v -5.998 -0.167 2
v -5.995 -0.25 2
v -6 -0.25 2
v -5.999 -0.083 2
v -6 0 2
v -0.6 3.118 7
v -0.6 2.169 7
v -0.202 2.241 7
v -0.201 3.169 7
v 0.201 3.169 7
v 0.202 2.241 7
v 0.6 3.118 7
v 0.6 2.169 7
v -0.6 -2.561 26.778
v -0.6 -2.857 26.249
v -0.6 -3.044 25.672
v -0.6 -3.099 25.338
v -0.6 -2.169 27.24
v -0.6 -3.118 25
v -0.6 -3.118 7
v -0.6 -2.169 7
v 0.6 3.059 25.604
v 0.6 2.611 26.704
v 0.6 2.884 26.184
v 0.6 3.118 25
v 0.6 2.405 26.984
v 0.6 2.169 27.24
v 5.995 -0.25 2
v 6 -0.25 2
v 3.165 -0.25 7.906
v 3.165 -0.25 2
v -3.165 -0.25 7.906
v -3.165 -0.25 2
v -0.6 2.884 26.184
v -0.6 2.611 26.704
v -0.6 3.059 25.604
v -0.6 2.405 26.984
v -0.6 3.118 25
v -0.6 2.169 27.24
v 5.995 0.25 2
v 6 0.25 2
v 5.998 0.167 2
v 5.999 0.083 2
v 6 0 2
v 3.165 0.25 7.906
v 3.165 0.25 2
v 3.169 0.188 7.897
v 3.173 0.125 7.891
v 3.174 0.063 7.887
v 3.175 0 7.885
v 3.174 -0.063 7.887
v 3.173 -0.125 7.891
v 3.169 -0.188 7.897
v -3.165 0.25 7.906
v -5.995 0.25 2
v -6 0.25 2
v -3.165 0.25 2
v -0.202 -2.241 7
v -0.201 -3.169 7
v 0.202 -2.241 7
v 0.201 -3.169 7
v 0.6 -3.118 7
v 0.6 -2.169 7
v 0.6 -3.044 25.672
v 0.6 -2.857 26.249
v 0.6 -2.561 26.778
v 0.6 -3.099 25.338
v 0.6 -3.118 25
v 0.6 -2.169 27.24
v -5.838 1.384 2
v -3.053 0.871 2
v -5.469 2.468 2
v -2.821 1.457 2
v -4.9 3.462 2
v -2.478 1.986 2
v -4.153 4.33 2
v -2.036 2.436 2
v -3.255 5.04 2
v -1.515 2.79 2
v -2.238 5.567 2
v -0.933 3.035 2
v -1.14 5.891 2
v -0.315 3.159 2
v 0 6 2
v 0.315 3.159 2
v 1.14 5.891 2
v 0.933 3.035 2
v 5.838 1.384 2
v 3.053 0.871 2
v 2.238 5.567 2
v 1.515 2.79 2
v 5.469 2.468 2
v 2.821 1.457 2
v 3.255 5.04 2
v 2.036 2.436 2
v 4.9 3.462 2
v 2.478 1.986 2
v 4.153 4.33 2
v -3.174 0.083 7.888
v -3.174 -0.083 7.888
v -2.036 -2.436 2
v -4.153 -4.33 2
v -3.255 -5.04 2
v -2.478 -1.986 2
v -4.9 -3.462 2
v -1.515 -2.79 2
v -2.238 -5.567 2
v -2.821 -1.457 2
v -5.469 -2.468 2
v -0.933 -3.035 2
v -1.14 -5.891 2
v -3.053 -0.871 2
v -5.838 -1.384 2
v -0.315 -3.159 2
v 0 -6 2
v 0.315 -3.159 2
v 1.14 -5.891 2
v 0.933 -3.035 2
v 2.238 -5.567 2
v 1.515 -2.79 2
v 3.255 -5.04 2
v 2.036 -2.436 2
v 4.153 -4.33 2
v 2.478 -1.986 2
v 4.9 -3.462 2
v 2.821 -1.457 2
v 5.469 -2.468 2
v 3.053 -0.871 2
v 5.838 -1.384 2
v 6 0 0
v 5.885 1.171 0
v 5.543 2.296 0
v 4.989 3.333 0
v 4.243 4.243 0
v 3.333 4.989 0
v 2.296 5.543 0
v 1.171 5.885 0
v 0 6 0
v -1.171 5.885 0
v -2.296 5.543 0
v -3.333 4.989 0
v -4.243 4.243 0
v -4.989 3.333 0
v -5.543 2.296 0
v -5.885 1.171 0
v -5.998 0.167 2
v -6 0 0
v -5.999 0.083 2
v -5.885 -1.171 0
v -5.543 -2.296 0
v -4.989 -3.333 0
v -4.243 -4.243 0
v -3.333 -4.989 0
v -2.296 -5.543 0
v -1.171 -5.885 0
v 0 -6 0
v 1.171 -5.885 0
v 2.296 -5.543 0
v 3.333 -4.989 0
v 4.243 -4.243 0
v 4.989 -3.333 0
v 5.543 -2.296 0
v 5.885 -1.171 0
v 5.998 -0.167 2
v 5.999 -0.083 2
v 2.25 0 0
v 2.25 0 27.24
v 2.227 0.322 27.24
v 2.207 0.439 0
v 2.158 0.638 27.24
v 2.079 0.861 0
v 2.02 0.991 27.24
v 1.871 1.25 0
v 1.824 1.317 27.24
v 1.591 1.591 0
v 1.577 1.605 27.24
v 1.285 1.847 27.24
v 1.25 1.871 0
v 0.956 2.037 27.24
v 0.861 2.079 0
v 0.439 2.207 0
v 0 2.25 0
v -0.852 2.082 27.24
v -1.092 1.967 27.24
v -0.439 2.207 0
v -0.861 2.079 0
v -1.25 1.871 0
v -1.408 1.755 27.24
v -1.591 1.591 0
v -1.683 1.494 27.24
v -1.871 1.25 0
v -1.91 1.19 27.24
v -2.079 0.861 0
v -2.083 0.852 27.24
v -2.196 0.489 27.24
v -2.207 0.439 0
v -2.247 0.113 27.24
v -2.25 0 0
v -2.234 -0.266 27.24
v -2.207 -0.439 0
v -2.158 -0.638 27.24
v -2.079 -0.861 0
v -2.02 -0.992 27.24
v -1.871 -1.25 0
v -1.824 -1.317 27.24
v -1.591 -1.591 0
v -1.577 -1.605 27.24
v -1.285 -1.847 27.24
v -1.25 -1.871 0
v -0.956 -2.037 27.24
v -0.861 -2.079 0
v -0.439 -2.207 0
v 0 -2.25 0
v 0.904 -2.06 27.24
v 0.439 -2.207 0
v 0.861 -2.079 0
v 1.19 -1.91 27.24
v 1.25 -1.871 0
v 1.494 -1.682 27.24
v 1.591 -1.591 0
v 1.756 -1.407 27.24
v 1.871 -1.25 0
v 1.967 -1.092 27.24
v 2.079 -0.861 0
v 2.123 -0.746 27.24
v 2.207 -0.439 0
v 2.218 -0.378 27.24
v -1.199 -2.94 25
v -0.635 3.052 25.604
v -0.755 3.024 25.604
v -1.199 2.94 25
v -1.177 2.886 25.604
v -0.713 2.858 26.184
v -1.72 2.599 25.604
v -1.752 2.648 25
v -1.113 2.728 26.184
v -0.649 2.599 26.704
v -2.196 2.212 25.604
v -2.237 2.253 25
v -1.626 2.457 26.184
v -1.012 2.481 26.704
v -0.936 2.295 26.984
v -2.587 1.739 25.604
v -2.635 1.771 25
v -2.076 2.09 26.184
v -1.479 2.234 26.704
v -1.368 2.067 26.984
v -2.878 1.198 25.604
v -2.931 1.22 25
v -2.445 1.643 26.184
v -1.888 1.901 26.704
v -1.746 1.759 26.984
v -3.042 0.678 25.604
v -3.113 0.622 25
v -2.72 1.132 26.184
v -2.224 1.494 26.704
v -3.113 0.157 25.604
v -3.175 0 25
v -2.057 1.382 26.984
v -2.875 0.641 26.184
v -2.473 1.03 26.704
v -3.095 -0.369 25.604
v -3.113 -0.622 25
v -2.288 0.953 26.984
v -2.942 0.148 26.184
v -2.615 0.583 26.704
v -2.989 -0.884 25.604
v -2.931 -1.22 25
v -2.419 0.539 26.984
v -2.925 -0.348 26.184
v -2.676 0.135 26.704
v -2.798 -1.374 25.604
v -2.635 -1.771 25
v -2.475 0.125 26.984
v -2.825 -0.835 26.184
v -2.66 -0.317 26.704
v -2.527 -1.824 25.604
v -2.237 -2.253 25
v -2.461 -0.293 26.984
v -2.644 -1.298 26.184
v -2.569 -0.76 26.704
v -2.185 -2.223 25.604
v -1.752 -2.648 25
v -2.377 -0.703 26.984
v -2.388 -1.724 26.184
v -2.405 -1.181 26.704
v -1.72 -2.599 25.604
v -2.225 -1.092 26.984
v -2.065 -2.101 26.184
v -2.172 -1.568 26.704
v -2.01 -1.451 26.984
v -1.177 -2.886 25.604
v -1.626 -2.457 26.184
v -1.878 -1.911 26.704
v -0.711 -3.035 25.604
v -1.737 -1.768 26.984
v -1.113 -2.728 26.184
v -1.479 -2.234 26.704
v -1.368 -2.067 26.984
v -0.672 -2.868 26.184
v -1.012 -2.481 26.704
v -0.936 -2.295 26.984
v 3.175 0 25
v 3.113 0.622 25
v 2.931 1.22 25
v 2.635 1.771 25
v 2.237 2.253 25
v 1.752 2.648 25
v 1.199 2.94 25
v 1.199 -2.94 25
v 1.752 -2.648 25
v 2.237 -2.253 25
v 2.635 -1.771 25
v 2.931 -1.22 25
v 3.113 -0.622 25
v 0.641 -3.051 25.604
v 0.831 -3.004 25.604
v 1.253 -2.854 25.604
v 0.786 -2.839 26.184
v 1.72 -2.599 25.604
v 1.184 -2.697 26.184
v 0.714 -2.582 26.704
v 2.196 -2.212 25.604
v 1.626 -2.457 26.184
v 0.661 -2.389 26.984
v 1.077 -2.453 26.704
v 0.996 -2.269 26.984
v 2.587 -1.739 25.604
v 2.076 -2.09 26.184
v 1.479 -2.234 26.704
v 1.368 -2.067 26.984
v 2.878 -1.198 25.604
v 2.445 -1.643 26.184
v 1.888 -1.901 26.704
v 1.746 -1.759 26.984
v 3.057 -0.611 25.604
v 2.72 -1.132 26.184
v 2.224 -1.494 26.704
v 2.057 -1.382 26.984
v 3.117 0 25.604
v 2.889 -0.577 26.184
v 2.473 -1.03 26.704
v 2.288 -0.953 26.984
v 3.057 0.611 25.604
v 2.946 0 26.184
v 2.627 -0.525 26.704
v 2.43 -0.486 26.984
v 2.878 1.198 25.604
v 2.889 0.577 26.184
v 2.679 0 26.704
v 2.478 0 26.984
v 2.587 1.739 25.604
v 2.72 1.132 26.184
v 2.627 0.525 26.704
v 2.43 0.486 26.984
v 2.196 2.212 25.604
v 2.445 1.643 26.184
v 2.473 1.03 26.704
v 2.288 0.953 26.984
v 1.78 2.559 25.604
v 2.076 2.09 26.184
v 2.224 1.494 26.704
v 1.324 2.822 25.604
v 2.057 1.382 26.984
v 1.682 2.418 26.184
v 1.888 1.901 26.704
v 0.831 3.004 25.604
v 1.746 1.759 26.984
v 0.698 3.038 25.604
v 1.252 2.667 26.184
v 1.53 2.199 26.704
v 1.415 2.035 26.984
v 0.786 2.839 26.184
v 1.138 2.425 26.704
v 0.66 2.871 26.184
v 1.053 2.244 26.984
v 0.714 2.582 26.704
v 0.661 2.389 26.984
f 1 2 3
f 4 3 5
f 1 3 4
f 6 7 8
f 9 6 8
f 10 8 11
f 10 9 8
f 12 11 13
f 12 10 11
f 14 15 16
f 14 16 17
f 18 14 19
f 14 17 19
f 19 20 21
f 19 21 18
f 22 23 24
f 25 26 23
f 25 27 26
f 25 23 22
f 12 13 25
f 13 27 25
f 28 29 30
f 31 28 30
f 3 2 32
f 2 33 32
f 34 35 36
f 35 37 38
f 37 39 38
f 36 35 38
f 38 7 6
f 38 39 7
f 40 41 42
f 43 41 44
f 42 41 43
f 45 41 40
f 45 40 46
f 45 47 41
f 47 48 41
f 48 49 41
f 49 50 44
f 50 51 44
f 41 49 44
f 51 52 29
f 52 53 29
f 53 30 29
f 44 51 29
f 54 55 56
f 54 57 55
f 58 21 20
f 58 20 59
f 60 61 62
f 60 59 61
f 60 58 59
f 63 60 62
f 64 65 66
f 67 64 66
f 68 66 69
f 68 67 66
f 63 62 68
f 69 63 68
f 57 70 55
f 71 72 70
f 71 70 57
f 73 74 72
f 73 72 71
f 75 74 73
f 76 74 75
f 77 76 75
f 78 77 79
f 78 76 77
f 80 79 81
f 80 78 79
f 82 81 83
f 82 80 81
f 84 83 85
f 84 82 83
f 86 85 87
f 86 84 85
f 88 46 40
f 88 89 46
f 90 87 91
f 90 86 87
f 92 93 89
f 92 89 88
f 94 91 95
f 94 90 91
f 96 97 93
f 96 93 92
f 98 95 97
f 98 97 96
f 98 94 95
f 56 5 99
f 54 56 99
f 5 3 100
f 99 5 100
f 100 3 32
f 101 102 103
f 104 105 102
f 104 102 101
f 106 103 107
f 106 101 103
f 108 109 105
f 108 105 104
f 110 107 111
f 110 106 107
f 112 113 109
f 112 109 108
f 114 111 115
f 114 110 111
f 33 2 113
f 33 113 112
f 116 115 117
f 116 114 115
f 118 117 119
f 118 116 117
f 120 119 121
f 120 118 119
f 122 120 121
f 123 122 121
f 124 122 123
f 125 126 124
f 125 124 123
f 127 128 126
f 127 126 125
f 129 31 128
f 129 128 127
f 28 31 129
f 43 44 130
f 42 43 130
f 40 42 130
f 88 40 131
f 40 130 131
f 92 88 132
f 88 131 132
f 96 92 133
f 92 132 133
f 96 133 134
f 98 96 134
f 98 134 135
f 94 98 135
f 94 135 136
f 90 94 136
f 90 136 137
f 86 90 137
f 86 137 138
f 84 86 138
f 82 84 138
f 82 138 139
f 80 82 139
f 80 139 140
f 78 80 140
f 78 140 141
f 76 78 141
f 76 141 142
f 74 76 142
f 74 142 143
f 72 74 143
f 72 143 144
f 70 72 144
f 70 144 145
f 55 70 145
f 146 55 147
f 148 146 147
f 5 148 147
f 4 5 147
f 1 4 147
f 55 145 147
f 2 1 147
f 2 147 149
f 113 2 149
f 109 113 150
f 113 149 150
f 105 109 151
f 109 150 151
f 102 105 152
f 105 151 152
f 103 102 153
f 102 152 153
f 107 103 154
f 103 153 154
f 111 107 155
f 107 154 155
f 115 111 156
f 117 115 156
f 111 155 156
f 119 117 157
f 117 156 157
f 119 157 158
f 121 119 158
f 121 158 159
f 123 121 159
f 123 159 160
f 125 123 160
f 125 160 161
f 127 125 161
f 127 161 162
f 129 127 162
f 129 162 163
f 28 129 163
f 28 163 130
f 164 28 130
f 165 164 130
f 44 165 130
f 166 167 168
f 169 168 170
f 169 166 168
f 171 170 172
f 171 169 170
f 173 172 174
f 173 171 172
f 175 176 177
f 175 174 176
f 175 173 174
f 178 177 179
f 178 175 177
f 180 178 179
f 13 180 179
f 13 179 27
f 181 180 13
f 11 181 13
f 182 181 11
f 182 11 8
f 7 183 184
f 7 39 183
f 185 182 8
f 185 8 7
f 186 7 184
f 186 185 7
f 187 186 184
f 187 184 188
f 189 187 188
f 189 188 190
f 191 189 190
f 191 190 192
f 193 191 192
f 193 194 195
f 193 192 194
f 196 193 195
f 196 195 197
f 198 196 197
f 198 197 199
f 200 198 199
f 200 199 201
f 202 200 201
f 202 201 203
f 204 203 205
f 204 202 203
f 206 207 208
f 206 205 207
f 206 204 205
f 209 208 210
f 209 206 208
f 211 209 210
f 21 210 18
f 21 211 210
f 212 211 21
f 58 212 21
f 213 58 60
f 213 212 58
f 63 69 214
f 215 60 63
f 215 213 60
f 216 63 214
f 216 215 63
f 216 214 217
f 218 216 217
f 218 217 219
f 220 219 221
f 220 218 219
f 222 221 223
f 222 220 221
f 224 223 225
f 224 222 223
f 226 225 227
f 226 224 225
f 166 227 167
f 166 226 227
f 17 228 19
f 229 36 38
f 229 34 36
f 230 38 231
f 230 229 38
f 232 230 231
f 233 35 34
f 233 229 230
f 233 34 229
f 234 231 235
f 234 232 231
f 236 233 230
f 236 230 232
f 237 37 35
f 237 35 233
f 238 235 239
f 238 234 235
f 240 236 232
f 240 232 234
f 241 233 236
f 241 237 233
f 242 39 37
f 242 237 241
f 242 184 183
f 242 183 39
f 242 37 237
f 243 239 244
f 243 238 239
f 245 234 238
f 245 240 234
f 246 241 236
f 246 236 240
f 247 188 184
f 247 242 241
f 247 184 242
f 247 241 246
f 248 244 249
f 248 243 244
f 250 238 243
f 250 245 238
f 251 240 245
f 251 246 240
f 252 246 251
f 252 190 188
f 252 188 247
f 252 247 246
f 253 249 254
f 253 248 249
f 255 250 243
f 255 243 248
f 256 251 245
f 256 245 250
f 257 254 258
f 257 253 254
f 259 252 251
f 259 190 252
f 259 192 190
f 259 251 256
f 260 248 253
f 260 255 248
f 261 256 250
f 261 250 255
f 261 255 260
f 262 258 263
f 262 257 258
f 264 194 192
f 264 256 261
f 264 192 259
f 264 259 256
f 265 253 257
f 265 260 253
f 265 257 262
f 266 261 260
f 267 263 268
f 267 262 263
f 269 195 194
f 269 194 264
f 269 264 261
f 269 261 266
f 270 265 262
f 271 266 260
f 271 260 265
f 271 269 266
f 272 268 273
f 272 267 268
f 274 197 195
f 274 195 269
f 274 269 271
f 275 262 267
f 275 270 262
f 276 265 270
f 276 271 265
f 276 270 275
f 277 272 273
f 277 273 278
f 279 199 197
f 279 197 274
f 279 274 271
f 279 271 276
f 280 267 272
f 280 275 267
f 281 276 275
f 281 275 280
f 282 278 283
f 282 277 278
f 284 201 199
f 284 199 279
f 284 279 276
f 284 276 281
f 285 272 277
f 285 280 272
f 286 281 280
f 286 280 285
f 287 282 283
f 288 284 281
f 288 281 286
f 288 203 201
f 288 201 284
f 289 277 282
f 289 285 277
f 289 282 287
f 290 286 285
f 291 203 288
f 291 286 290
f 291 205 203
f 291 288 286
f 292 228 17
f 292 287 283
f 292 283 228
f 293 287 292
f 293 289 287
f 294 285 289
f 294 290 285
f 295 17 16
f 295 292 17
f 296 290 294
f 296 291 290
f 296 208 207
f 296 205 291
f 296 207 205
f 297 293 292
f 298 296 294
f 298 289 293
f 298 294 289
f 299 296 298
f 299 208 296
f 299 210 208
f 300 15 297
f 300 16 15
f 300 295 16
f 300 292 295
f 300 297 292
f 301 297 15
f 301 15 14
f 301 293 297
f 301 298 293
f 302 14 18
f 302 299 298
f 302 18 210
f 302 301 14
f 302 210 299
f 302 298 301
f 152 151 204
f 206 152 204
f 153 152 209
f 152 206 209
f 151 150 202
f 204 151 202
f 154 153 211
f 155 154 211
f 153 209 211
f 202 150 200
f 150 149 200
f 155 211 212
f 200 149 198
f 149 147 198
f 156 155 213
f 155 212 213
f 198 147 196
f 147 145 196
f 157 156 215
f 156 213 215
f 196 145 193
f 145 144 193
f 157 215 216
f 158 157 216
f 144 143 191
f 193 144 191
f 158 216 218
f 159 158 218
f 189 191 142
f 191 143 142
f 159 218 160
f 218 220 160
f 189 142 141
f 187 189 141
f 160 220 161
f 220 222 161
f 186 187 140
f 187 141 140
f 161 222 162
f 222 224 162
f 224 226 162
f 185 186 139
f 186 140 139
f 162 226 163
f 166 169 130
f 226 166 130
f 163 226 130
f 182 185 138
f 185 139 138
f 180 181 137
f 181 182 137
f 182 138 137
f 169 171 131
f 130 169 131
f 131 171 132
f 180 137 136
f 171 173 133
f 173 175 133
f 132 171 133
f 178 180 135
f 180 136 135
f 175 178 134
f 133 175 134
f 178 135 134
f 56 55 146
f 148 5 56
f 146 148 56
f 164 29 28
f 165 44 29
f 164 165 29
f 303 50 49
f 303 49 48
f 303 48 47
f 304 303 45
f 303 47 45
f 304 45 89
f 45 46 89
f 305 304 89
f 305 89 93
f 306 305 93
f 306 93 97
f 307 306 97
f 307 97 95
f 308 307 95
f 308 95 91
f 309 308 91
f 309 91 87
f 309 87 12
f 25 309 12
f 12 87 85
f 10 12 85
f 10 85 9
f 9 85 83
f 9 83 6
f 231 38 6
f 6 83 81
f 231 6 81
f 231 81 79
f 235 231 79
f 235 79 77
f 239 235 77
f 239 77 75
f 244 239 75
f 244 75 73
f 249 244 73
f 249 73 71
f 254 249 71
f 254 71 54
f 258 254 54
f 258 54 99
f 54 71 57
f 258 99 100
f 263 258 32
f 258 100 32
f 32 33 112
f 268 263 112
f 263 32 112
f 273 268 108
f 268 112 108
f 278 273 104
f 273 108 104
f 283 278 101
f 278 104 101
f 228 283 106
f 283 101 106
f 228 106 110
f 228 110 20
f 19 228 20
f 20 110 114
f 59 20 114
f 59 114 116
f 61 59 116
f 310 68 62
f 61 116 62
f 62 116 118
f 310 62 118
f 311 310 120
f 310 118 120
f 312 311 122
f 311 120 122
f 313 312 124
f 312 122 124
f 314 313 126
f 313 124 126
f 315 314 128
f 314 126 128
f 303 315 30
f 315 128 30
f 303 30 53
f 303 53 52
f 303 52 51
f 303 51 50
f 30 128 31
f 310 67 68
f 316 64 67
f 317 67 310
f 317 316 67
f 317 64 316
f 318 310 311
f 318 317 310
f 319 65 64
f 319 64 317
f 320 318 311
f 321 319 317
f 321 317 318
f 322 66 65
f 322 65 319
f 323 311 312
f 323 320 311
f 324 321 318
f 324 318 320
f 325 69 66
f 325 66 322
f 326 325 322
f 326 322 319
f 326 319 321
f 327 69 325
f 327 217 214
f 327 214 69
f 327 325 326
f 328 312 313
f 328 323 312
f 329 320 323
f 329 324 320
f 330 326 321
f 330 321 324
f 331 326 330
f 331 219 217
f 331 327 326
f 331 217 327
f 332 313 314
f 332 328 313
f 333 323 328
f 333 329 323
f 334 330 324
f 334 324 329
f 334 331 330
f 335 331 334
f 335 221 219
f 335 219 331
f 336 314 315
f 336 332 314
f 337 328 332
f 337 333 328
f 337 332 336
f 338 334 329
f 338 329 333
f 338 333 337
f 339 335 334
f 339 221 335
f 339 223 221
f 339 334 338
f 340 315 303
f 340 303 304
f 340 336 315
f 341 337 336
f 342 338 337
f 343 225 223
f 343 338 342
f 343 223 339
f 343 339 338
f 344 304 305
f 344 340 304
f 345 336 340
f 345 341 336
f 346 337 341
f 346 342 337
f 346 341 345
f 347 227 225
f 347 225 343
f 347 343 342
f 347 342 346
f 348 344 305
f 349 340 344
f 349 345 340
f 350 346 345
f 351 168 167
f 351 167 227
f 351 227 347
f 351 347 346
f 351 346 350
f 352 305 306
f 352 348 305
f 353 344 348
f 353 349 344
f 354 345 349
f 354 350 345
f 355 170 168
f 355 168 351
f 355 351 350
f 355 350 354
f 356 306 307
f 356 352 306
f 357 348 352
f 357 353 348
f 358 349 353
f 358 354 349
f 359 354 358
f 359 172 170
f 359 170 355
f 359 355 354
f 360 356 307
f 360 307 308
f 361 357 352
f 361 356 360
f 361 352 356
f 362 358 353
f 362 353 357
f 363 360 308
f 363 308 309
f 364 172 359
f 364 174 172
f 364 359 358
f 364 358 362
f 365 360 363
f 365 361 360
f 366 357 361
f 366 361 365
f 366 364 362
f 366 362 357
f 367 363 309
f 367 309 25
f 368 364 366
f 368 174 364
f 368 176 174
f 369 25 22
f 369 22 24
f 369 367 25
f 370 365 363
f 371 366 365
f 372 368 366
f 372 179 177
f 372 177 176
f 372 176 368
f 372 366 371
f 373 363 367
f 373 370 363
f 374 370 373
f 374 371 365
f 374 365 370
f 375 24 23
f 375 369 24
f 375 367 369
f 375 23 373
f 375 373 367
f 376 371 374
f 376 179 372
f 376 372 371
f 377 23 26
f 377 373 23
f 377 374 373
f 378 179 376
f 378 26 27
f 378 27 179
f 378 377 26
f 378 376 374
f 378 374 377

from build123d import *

# Parameters (mm, degrees)
SKETCH001_R     = 6
PAD_DEPTH       = 2
SKETCH_R        = 3.175
SKETCH_R_2      = 2.25
PAD001_DEPTH    = 25
PAD002_DEPTH    = 0.25
SKETCH005_W     = 1.2
SKETCH005_H     = 6.35
POCKET_DEPTH    = 21.176
SKETCH006_R     = 2.25
POCKET001_DEPTH = 28.118792


with BuildPart() as part:
    # Sketch001 → Pad (new body)
    with BuildSketch(Plane.XY):
        Circle(SKETCH001_R)
    extrude(amount=PAD_DEPTH)

    # Sketch → Pad001 (join)
    with BuildSketch(Plane.XY):
        Circle(SKETCH_R)
        Circle(SKETCH_R_2, mode=Mode.SUBTRACT)
    extrude(amount=PAD001_DEPTH)

    # Sketch002 → Pad002 (join, symmetric)
    with BuildSketch(Plane.XZ):
        Polygon((-6, 2), (0, 14.5), (6, 2), align=None)
    extrude(amount=PAD002_DEPTH, both=True)

    # Sketch004 → Revolution (revolve)
    with BuildSketch(Plane.XZ):
        with BuildLine():
            ThreePointArc((3.175, 25), (2.245064, 27.245064), (0, 28.175))
            Line((0, 25), (0, 28.175))
            Line((0, 25), (3.175, 25))
        make_face()
    revolve(axis=Axis((0, 0, 0), (0, 0, 1)))

    # Sketch005 → Pocket (cut, through all)
    with BuildSketch(Plane.XY.offset(7)):
        Rectangle(SKETCH005_W, SKETCH005_H)
    extrude(amount=POCKET_DEPTH, mode=Mode.SUBTRACT)

    # Sketch006 → Pocket001 (cut, through all)
    with BuildSketch(Plane.XY):
        Circle(SKETCH006_R)
    extrude(amount=POCKET001_DEPTH, mode=Mode.SUBTRACT)


solid = part.part
